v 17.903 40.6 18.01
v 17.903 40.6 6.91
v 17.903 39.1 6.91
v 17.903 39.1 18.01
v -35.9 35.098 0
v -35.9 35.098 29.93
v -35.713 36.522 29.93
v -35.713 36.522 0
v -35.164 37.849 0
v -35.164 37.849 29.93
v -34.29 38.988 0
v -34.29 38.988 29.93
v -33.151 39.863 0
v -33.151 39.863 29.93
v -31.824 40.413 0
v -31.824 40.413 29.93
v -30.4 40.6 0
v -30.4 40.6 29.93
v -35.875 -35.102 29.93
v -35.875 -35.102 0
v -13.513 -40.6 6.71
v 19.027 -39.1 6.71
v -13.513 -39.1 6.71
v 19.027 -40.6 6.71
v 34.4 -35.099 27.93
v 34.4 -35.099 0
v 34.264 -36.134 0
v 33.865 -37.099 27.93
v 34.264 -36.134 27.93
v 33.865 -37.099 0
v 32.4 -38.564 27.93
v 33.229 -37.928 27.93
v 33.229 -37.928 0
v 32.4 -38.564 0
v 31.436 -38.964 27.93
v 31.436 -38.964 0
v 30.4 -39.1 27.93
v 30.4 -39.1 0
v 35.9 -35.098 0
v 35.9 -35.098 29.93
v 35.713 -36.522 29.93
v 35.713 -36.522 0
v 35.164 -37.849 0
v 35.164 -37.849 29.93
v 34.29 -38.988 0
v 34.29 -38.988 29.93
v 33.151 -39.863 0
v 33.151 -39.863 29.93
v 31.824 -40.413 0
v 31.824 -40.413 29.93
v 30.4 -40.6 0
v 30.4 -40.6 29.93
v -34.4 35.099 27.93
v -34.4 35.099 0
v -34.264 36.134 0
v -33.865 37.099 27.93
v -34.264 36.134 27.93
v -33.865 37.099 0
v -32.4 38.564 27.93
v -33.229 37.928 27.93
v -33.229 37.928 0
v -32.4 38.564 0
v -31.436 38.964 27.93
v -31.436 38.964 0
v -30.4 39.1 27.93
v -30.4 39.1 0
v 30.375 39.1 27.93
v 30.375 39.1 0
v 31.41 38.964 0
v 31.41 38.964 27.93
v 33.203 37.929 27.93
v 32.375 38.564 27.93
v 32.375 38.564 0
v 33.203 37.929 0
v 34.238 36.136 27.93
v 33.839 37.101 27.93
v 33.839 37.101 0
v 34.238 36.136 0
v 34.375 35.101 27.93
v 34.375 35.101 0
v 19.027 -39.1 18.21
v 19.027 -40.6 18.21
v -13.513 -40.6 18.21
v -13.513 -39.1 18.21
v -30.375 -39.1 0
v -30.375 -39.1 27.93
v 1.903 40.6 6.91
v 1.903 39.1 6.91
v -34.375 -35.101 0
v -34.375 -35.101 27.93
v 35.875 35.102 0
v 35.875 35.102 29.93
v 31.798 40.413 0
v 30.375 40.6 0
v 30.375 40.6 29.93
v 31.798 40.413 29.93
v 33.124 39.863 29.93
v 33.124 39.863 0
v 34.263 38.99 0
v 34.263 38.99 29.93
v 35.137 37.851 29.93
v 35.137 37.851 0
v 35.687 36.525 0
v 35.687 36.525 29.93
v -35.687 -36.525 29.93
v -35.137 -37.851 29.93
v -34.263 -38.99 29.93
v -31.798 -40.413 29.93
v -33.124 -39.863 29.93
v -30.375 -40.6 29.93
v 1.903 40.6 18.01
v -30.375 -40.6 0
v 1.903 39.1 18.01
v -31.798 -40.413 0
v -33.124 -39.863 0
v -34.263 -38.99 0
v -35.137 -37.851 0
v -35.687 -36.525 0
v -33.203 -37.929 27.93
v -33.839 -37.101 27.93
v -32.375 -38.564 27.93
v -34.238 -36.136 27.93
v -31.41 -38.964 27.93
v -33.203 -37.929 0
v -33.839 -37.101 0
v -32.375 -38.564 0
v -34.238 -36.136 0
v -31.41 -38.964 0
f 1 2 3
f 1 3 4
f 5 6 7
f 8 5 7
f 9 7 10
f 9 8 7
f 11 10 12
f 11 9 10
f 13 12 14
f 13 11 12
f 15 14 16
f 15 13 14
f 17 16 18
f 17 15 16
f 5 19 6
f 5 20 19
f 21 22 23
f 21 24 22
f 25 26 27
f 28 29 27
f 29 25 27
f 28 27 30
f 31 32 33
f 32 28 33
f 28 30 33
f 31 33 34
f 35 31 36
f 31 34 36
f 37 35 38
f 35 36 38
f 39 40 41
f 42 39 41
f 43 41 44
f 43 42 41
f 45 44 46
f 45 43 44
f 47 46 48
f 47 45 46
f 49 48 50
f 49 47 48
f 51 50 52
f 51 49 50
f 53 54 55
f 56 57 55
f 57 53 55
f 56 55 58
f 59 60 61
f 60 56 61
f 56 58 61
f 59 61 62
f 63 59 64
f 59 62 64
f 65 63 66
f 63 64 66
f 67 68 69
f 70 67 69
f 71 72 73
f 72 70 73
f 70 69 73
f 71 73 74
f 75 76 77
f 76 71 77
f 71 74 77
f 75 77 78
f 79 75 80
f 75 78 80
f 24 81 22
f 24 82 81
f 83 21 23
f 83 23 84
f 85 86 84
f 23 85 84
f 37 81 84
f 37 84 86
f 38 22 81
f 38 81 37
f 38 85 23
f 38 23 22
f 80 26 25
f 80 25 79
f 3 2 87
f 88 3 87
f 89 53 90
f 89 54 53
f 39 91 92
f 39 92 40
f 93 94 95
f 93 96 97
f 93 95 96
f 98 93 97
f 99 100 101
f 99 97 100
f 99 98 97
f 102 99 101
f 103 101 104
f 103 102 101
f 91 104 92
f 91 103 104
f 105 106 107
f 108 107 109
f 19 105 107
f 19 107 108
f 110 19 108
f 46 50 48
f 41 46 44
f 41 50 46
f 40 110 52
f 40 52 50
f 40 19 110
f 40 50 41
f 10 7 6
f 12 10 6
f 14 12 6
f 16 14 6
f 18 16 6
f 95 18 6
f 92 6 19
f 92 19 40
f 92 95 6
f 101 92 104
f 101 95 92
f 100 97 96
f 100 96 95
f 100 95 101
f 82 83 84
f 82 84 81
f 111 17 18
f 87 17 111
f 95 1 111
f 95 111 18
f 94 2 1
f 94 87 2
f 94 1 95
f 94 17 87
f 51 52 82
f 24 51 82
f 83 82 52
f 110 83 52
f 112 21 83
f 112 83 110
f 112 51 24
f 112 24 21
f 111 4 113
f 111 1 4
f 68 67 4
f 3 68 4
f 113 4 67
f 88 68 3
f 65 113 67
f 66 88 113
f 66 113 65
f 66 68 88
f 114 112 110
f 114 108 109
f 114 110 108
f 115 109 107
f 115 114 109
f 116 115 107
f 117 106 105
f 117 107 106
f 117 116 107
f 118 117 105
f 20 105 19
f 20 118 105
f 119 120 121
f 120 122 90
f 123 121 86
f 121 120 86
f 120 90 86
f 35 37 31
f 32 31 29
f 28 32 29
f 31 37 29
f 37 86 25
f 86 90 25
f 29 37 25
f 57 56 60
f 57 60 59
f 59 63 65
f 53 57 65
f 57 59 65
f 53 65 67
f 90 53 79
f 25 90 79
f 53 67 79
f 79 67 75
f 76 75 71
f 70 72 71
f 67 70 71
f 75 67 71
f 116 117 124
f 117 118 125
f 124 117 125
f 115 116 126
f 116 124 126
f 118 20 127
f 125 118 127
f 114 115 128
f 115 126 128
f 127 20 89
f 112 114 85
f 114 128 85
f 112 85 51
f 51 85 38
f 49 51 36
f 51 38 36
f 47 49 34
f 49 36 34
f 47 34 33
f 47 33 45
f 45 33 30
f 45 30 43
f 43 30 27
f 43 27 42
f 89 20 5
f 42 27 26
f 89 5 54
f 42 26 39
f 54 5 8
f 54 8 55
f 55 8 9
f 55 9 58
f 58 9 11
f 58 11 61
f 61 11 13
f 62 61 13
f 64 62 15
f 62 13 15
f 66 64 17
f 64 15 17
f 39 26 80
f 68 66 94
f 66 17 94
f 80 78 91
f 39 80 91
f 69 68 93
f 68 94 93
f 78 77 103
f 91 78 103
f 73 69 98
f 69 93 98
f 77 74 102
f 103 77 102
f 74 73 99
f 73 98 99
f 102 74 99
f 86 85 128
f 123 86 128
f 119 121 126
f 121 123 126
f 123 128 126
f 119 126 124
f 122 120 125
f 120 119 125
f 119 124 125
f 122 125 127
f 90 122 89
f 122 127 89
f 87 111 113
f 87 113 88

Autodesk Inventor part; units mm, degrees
ref_plane "YZ Plane" through (0, 0, 0) normal (1, 0, 0) x (0, 1, 0)
ref_plane "XZ Plane" through (0, 0, 0) normal (0, 1, 0) x (-1, 0, 0)
ref_plane "XY Plane" through (0, 0, 0) normal (0, 0, 1) x (1, 0, 0)
ref_plane "Work Plane1" through (0, 0, 0) normal (0, 0, 1) x (1, 0, 0)
sketch "Sketch1" plane through (0, 0, 0) normal (0, 0, 1) x (1, 0, 0)
  line L0 (30.375, 39.1) -> (-30.4, 39.1) projected
  arc A0 (34.375, 35.1014) -> (30.375, 39.1) centre (30.375, 35.1) ccw projected
  line L1 (34.4, -35.0986) -> (34.375, 35.1014) projected
  arc A1 (30.4, -39.1) -> (34.4, -35.0986) centre (30.4, -35.1) ccw projected
  line L2 (-30.375, -39.1) -> (30.4, -39.1) projected
  arc A2 (-34.375, -35.1014) -> (-30.375, -39.1) centre (-30.375, -35.1) ccw projected
  line L3 (-34.4, 35.0986) -> (-34.375, -35.1014) projected
  arc A3 (-30.4, 39.1) -> (-34.4, 35.0986) centre (-30.4, 35.1) ccw projected
  arc A4 (-35.875, -35.102) -> (-30.375, -40.6) centre (-30.375, -35.1) ccw projected
  line L4 (30.4, -40.6) -> (-30.375, -40.6) projected
  arc A5 (30.4, -40.6) -> (35.9, -35.098) centre (30.4, -35.1) ccw projected
  line L5 (35.875, 35.102) -> (35.9, -35.098) projected
  arc A6 (35.875, 35.102) -> (30.375, 40.6) centre (30.375, 35.1) ccw projected
  line L6 (-30.4, 40.6) -> (30.375, 40.6) projected
  arc A7 (-30.4, 40.6) -> (-35.9, 35.098) centre (-30.4, 35.1) ccw projected
  line L7 (-35.875, -35.102) -> (-35.9, 35.098) projected
  point P0 (0, 0)
extrude "Extrusion1" add sketch "Sketch1" along normal blind 27.93
sketch "Sketch2" plane through (0, 0, 27.93) normal (0, 0, 1) x (1, 0, 0)
  line L0 (-35.9, 35.098) -> (-35.875, -35.102) projected
  arc A0 (-35.875, -35.102) -> (-30.375, -40.6) centre (-30.375, -35.1) ccw projected
  line L1 (-30.375, -40.6) -> (30.4, -40.6) projected
  arc A1 (30.4, -40.6) -> (35.9, -35.098) centre (30.4, -35.1) ccw projected
  line L2 (35.9, -35.098) -> (35.875, 35.102) projected
  arc A2 (35.875, 35.102) -> (30.375, 40.6) centre (30.375, 35.1) ccw projected
  line L3 (30.375, 40.6) -> (-30.4, 40.6) projected
  arc A3 (-30.4, 40.6) -> (-35.9, 35.098) centre (-30.4, 35.1) ccw projected
  point P0 (0, 0)
extrude "Extrusion2" add sketch "Sketch2" along normal blind 2
sketch "Sketch3" plane through (-30.4, 40.6, 0) normal (0, 1, 0) x (1, 0, 0)
  line L0 (48.3031, -6.91) -> (17.8231, -6.91) projected
  line L1 (48.3031, -6.91) -> (48.3031, -18.01) projected
  line L2 (17.8231, -6.91) -> (17.8231, -18.01) projected
  line L3 (48.3031, -18.01) -> (17.8231, -18.01)
  line L4 (48.3031, -18.01) -> (32.3031, -18.01)
  line L5 (32.3031, -18.01) -> (32.3031, -6.91)
  point P0 (30.4, 0)
  dimension "d9" = 16
extrude "Extrusion3" cut sketch "Sketch3" against normal blind 7.45 contours L1 L3 L5 L0
sketch "Sketch4" plane through (-30.375, -40.6, 0) normal (0, -1, 0) x (1, 0, 0)
  line L0 (17.0619, 6.91) -> (17.0619, 18.01) projected
  line L1 (32.3019, 6.91) -> (17.0619, 6.91) projected
  line L2 (49.2019, 6.91) -> (33.9619, 6.91) projected
  line L3 (49.2019, 6.91) -> (49.2019, 18.01) projected
  line L4 (17.0619, 18.01) -> (49.2019, 18.01)
  line L5 (32.3019, 6.91) -> (33.9619, 6.91)
  line L6 (-0.025, 0) -> (60.75, 0) projected
  line L7 (49.4019, 18.21) -> (49.4019, 6.71)
  line L8 (49.4019, 6.71) -> (33.9619, 6.71)
  line L9 (33.9619, 6.71) -> (32.3019, 6.71)
  line L10 (32.3019, 6.71) -> (16.8619, 6.71)
  line L11 (16.8619, 6.71) -> (16.8619, 18.21)
  line L12 (16.8619, 18.21) -> (49.4019, 18.21)
  point P0 (30.375, 0)
  dimension "d6" = 0.2
extrude "Extrusion4" cut sketch "Sketch4" against normal blind 7.45 contours L0 L4 L3 L2 L5 L1 | L7 L8 L9 L10 L11 L12
